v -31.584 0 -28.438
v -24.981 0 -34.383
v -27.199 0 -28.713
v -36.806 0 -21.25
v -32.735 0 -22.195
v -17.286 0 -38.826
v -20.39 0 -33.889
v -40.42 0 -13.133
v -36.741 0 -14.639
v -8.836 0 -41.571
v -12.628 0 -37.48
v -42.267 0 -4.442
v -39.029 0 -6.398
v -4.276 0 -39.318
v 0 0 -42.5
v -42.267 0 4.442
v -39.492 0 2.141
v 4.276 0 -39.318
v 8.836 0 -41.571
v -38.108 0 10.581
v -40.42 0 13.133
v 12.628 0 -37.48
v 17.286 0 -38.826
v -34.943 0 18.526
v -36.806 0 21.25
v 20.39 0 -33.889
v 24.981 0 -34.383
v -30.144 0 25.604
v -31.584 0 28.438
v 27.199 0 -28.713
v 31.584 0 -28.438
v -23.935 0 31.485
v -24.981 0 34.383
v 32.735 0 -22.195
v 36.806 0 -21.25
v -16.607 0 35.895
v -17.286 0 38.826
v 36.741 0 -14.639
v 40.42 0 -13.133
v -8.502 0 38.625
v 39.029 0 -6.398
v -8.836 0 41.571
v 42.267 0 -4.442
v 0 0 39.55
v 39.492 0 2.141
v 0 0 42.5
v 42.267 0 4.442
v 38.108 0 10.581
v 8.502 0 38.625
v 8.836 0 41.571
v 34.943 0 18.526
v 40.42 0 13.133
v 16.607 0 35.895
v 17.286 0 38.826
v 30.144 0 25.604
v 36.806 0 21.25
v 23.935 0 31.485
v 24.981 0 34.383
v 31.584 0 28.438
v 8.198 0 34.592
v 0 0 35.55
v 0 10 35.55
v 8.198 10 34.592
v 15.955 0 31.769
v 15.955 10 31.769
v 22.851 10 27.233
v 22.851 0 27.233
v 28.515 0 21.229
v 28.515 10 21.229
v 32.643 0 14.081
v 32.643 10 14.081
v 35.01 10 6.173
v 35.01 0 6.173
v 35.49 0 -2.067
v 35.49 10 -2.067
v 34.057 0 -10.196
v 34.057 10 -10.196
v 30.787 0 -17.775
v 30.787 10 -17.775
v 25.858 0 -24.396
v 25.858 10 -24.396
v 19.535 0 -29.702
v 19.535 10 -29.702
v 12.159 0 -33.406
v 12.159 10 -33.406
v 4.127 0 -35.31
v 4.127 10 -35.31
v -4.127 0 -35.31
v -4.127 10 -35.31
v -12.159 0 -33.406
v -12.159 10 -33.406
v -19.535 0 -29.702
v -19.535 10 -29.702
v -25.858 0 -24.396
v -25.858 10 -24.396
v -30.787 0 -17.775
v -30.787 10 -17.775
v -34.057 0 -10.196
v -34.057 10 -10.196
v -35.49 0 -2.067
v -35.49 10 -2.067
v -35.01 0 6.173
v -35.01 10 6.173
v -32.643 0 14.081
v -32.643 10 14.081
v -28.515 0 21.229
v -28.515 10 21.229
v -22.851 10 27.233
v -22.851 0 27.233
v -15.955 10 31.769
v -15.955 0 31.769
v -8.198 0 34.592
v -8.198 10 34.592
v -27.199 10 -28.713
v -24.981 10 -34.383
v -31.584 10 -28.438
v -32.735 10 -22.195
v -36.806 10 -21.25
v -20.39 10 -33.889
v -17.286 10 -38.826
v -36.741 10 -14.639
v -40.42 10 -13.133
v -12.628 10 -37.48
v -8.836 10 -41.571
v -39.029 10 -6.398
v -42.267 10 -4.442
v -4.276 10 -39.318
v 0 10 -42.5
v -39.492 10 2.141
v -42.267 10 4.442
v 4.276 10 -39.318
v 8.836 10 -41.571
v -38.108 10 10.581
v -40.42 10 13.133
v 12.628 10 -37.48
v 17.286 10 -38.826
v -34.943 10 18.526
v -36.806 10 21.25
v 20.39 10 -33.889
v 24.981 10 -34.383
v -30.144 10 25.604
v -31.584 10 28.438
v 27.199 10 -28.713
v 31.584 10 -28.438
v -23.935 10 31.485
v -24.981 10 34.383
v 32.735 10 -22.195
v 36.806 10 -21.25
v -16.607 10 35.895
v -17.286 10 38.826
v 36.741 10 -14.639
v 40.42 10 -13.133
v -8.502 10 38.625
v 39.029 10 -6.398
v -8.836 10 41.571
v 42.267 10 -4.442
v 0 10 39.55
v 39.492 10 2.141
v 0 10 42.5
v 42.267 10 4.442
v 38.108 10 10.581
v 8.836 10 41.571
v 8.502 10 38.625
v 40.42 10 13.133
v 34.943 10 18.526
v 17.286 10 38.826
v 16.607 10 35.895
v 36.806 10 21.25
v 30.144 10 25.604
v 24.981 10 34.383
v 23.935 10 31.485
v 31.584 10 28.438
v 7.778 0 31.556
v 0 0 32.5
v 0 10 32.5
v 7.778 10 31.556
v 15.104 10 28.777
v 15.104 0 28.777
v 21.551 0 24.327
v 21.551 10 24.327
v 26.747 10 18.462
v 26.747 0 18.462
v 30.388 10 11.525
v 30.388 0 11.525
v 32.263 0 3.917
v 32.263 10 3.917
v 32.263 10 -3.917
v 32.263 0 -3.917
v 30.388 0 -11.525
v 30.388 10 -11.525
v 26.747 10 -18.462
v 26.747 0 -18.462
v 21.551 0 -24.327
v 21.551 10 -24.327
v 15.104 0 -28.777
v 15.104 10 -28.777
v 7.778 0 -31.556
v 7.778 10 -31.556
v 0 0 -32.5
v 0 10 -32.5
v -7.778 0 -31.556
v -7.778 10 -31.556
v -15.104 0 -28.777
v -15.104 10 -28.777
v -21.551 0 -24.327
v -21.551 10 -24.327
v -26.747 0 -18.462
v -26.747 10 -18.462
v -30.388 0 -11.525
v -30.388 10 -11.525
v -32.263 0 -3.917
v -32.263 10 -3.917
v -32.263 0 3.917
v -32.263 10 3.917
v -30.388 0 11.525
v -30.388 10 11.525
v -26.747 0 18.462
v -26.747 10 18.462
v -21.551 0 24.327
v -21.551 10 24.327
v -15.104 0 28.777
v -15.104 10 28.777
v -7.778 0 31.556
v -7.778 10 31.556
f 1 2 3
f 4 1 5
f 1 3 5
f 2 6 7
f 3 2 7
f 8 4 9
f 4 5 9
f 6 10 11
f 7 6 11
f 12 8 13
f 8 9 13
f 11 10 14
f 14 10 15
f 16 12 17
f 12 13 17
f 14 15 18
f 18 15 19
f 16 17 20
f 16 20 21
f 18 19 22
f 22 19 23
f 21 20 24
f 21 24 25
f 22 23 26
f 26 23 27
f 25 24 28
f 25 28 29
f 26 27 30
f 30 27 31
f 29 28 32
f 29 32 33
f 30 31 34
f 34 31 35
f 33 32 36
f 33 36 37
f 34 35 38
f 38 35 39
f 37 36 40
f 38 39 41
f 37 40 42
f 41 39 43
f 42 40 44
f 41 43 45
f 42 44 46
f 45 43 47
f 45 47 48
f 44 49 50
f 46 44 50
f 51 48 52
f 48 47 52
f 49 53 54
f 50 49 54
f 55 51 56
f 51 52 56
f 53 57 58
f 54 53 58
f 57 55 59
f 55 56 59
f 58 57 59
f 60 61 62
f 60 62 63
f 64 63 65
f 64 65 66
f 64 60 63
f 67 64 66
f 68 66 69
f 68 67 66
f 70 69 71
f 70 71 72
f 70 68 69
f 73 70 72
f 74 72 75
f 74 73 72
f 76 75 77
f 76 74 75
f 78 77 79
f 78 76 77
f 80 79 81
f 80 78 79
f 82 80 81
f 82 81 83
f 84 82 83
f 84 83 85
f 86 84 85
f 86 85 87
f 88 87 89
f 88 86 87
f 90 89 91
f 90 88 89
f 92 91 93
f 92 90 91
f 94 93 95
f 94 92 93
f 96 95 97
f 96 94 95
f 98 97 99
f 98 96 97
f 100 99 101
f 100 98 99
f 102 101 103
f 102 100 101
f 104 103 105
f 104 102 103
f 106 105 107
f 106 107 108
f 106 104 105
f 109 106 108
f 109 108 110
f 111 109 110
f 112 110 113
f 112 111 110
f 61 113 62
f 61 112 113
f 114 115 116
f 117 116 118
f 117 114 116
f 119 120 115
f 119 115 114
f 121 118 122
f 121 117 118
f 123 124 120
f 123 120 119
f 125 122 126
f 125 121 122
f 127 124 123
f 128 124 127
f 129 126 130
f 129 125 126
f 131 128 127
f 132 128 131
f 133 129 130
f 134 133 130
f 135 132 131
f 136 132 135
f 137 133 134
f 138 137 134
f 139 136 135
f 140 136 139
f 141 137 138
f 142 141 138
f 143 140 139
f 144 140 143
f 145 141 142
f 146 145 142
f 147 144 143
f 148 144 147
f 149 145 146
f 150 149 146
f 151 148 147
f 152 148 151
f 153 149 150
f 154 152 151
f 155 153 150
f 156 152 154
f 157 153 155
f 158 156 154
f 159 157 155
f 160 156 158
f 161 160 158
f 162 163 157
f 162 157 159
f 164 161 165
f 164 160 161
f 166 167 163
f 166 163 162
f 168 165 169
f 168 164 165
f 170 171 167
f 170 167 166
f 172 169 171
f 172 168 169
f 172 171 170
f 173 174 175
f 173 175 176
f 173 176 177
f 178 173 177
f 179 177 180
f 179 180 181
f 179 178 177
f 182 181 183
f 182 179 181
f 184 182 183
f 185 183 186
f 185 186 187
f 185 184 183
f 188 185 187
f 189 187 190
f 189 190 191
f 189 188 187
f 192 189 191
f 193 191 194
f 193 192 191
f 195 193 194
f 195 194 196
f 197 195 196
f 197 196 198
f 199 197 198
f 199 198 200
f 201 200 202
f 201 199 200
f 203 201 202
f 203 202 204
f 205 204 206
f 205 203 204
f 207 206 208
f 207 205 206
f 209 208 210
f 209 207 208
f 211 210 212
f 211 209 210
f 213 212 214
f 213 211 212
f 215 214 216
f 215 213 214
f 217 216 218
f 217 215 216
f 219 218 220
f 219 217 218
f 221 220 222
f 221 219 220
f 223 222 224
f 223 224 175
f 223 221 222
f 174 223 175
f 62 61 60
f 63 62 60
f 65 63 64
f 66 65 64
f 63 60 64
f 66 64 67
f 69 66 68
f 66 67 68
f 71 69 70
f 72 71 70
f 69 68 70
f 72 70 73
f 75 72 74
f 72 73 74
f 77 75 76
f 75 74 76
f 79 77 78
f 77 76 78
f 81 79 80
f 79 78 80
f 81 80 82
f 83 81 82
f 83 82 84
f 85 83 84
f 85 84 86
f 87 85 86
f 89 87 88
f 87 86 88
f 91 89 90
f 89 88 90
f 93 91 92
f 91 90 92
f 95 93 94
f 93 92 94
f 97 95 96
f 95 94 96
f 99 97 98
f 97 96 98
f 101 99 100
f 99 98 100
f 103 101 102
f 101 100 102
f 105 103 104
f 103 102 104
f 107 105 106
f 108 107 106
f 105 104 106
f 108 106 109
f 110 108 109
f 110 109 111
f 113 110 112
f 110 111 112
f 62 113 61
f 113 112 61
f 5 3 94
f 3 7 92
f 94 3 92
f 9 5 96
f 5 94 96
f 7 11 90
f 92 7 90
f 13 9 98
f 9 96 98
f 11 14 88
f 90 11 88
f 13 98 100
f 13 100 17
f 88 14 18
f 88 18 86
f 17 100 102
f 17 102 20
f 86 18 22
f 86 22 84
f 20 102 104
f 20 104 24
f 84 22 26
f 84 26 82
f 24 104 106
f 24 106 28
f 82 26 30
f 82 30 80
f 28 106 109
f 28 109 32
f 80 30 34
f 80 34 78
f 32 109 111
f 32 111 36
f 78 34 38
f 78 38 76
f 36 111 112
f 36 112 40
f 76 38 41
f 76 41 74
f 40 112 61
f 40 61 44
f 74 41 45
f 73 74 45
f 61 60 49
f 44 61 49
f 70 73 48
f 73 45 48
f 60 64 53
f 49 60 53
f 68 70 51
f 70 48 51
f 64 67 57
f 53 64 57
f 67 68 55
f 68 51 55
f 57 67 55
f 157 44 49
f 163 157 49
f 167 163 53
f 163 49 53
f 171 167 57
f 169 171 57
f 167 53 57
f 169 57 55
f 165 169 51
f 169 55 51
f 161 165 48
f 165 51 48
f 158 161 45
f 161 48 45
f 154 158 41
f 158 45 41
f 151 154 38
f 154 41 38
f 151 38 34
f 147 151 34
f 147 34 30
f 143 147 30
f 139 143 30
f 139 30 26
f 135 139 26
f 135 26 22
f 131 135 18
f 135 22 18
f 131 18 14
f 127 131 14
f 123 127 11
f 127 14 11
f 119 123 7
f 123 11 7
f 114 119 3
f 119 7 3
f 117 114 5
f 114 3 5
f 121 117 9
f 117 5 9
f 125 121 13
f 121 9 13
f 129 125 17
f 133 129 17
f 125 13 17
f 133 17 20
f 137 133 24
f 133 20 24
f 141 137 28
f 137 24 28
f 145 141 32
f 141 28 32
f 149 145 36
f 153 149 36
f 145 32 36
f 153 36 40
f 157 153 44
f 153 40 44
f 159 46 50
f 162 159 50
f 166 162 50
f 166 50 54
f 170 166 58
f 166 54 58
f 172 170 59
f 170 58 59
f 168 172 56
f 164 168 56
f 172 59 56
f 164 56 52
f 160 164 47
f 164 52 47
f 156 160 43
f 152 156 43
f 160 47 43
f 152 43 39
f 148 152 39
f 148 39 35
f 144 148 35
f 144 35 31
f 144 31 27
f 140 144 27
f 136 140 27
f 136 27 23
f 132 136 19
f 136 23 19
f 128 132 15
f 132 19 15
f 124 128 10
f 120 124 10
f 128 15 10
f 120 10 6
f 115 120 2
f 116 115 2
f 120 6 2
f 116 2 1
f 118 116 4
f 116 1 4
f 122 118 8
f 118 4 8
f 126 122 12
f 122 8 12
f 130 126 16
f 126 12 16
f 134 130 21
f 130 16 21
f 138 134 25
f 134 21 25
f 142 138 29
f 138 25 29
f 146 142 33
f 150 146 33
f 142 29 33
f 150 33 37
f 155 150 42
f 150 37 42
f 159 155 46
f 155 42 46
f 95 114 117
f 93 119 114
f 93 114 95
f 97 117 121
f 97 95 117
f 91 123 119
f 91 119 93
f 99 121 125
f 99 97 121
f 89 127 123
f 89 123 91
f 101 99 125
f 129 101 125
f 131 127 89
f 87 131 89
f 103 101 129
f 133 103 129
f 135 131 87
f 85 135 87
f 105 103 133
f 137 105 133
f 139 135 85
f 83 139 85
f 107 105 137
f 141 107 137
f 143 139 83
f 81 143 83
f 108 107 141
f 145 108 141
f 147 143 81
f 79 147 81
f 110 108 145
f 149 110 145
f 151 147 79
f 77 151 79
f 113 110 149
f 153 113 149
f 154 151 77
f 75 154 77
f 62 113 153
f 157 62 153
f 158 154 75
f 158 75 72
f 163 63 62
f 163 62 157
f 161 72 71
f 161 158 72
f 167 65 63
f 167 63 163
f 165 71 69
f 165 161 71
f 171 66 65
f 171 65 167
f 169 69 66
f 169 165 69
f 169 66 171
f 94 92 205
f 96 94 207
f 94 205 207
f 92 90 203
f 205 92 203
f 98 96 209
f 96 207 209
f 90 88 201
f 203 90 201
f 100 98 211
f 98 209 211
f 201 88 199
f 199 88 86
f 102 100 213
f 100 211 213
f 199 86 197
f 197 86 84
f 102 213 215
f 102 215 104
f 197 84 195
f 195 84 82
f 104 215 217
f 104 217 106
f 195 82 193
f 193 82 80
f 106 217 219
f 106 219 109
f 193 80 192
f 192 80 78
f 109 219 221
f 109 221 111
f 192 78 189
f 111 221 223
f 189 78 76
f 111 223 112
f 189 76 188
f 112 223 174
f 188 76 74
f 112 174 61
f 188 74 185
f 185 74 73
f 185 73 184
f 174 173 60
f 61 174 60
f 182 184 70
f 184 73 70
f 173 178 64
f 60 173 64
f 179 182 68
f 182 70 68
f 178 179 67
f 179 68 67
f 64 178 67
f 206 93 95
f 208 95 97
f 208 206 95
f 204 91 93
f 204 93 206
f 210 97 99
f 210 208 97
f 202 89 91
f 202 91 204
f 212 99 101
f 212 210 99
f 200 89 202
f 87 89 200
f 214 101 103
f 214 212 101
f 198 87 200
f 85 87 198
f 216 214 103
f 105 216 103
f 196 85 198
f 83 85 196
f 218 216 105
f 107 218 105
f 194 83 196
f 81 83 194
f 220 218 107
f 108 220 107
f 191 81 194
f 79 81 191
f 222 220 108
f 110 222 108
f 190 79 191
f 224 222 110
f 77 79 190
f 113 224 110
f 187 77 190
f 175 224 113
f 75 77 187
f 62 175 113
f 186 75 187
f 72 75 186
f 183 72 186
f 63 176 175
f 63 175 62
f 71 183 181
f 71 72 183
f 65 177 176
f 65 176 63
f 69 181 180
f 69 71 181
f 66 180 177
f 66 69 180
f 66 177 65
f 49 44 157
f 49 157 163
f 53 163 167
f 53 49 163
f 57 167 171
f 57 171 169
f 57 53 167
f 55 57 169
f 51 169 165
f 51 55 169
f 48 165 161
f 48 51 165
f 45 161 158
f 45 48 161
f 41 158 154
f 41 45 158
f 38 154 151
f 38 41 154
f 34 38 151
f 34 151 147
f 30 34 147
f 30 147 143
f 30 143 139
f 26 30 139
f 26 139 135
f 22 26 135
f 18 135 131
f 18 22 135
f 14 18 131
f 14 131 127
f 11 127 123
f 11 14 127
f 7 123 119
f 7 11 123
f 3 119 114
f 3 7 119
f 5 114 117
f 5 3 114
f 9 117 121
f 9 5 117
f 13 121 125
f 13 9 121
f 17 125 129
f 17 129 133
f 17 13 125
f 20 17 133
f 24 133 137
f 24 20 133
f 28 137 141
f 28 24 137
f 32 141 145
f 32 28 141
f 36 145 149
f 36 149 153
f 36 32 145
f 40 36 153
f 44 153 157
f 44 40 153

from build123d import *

# Parameters (mm, degrees)
SKETCH1_R           = 35.55
SKETCH1_R_2         = 32.5
BOSS_EXTRUDE1_DEPTH = 10
SKETCH2_R           = 39.55
SKETCH2_R_2         = 35.55
BOSS_EXTRUDE2_DEPTH = 10
SKETCH3_R           = 42.5
SKETCH3_R_2         = 39.55
BOSS_EXTRUDE4_DEPTH = 10


with BuildPart() as part:
    # Sketch1 → Boss-Extrude1 (new body)
    with BuildSketch(Plane(origin=(0, 0, 0), x_dir=(1, 0, 0), z_dir=(0, 1, 0))):
        with Locations(Location((0, 0, 0), (0, 0, 270))):
            Circle(SKETCH1_R)
        with Locations(Location((0, 0, 0), (0, 0, 270))):
            Circle(SKETCH1_R_2, mode=Mode.SUBTRACT)
    extrude(amount=BOSS_EXTRUDE1_DEPTH)


with BuildPart() as body_2:
    # Sketch2 → Boss-Extrude2 (new body)
    with BuildSketch(Plane(origin=(0, 0, 0), x_dir=(1, 0, 0), z_dir=(0, 1, 0))):
        with Locations(Location((0, 0, 0), (0, 0, 270))):
            Circle(SKETCH2_R)
        with Locations(Location((0, 0, 0), (0, 0, 270))):
            Circle(SKETCH2_R_2, mode=Mode.SUBTRACT)
    extrude(amount=BOSS_EXTRUDE2_DEPTH)


with BuildPart() as body_3:
    # Sketch3 → Boss-Extrude4 (new body)
    with BuildSketch(Plane(origin=(0, 0, 0), x_dir=(1, 0, 0), z_dir=(0, 1, 0))):
        with Locations(Location((0, 0, 0), (0, 0, 270))):
            Circle(SKETCH3_R)
        with Locations(Location((0, 0, 0), (0, 0, 270))):
            Circle(SKETCH3_R_2, mode=Mode.SUBTRACT)
    extrude(amount=BOSS_EXTRUDE4_DEPTH)


solid = Compound([part.part, body_2.part, body_3.part])
